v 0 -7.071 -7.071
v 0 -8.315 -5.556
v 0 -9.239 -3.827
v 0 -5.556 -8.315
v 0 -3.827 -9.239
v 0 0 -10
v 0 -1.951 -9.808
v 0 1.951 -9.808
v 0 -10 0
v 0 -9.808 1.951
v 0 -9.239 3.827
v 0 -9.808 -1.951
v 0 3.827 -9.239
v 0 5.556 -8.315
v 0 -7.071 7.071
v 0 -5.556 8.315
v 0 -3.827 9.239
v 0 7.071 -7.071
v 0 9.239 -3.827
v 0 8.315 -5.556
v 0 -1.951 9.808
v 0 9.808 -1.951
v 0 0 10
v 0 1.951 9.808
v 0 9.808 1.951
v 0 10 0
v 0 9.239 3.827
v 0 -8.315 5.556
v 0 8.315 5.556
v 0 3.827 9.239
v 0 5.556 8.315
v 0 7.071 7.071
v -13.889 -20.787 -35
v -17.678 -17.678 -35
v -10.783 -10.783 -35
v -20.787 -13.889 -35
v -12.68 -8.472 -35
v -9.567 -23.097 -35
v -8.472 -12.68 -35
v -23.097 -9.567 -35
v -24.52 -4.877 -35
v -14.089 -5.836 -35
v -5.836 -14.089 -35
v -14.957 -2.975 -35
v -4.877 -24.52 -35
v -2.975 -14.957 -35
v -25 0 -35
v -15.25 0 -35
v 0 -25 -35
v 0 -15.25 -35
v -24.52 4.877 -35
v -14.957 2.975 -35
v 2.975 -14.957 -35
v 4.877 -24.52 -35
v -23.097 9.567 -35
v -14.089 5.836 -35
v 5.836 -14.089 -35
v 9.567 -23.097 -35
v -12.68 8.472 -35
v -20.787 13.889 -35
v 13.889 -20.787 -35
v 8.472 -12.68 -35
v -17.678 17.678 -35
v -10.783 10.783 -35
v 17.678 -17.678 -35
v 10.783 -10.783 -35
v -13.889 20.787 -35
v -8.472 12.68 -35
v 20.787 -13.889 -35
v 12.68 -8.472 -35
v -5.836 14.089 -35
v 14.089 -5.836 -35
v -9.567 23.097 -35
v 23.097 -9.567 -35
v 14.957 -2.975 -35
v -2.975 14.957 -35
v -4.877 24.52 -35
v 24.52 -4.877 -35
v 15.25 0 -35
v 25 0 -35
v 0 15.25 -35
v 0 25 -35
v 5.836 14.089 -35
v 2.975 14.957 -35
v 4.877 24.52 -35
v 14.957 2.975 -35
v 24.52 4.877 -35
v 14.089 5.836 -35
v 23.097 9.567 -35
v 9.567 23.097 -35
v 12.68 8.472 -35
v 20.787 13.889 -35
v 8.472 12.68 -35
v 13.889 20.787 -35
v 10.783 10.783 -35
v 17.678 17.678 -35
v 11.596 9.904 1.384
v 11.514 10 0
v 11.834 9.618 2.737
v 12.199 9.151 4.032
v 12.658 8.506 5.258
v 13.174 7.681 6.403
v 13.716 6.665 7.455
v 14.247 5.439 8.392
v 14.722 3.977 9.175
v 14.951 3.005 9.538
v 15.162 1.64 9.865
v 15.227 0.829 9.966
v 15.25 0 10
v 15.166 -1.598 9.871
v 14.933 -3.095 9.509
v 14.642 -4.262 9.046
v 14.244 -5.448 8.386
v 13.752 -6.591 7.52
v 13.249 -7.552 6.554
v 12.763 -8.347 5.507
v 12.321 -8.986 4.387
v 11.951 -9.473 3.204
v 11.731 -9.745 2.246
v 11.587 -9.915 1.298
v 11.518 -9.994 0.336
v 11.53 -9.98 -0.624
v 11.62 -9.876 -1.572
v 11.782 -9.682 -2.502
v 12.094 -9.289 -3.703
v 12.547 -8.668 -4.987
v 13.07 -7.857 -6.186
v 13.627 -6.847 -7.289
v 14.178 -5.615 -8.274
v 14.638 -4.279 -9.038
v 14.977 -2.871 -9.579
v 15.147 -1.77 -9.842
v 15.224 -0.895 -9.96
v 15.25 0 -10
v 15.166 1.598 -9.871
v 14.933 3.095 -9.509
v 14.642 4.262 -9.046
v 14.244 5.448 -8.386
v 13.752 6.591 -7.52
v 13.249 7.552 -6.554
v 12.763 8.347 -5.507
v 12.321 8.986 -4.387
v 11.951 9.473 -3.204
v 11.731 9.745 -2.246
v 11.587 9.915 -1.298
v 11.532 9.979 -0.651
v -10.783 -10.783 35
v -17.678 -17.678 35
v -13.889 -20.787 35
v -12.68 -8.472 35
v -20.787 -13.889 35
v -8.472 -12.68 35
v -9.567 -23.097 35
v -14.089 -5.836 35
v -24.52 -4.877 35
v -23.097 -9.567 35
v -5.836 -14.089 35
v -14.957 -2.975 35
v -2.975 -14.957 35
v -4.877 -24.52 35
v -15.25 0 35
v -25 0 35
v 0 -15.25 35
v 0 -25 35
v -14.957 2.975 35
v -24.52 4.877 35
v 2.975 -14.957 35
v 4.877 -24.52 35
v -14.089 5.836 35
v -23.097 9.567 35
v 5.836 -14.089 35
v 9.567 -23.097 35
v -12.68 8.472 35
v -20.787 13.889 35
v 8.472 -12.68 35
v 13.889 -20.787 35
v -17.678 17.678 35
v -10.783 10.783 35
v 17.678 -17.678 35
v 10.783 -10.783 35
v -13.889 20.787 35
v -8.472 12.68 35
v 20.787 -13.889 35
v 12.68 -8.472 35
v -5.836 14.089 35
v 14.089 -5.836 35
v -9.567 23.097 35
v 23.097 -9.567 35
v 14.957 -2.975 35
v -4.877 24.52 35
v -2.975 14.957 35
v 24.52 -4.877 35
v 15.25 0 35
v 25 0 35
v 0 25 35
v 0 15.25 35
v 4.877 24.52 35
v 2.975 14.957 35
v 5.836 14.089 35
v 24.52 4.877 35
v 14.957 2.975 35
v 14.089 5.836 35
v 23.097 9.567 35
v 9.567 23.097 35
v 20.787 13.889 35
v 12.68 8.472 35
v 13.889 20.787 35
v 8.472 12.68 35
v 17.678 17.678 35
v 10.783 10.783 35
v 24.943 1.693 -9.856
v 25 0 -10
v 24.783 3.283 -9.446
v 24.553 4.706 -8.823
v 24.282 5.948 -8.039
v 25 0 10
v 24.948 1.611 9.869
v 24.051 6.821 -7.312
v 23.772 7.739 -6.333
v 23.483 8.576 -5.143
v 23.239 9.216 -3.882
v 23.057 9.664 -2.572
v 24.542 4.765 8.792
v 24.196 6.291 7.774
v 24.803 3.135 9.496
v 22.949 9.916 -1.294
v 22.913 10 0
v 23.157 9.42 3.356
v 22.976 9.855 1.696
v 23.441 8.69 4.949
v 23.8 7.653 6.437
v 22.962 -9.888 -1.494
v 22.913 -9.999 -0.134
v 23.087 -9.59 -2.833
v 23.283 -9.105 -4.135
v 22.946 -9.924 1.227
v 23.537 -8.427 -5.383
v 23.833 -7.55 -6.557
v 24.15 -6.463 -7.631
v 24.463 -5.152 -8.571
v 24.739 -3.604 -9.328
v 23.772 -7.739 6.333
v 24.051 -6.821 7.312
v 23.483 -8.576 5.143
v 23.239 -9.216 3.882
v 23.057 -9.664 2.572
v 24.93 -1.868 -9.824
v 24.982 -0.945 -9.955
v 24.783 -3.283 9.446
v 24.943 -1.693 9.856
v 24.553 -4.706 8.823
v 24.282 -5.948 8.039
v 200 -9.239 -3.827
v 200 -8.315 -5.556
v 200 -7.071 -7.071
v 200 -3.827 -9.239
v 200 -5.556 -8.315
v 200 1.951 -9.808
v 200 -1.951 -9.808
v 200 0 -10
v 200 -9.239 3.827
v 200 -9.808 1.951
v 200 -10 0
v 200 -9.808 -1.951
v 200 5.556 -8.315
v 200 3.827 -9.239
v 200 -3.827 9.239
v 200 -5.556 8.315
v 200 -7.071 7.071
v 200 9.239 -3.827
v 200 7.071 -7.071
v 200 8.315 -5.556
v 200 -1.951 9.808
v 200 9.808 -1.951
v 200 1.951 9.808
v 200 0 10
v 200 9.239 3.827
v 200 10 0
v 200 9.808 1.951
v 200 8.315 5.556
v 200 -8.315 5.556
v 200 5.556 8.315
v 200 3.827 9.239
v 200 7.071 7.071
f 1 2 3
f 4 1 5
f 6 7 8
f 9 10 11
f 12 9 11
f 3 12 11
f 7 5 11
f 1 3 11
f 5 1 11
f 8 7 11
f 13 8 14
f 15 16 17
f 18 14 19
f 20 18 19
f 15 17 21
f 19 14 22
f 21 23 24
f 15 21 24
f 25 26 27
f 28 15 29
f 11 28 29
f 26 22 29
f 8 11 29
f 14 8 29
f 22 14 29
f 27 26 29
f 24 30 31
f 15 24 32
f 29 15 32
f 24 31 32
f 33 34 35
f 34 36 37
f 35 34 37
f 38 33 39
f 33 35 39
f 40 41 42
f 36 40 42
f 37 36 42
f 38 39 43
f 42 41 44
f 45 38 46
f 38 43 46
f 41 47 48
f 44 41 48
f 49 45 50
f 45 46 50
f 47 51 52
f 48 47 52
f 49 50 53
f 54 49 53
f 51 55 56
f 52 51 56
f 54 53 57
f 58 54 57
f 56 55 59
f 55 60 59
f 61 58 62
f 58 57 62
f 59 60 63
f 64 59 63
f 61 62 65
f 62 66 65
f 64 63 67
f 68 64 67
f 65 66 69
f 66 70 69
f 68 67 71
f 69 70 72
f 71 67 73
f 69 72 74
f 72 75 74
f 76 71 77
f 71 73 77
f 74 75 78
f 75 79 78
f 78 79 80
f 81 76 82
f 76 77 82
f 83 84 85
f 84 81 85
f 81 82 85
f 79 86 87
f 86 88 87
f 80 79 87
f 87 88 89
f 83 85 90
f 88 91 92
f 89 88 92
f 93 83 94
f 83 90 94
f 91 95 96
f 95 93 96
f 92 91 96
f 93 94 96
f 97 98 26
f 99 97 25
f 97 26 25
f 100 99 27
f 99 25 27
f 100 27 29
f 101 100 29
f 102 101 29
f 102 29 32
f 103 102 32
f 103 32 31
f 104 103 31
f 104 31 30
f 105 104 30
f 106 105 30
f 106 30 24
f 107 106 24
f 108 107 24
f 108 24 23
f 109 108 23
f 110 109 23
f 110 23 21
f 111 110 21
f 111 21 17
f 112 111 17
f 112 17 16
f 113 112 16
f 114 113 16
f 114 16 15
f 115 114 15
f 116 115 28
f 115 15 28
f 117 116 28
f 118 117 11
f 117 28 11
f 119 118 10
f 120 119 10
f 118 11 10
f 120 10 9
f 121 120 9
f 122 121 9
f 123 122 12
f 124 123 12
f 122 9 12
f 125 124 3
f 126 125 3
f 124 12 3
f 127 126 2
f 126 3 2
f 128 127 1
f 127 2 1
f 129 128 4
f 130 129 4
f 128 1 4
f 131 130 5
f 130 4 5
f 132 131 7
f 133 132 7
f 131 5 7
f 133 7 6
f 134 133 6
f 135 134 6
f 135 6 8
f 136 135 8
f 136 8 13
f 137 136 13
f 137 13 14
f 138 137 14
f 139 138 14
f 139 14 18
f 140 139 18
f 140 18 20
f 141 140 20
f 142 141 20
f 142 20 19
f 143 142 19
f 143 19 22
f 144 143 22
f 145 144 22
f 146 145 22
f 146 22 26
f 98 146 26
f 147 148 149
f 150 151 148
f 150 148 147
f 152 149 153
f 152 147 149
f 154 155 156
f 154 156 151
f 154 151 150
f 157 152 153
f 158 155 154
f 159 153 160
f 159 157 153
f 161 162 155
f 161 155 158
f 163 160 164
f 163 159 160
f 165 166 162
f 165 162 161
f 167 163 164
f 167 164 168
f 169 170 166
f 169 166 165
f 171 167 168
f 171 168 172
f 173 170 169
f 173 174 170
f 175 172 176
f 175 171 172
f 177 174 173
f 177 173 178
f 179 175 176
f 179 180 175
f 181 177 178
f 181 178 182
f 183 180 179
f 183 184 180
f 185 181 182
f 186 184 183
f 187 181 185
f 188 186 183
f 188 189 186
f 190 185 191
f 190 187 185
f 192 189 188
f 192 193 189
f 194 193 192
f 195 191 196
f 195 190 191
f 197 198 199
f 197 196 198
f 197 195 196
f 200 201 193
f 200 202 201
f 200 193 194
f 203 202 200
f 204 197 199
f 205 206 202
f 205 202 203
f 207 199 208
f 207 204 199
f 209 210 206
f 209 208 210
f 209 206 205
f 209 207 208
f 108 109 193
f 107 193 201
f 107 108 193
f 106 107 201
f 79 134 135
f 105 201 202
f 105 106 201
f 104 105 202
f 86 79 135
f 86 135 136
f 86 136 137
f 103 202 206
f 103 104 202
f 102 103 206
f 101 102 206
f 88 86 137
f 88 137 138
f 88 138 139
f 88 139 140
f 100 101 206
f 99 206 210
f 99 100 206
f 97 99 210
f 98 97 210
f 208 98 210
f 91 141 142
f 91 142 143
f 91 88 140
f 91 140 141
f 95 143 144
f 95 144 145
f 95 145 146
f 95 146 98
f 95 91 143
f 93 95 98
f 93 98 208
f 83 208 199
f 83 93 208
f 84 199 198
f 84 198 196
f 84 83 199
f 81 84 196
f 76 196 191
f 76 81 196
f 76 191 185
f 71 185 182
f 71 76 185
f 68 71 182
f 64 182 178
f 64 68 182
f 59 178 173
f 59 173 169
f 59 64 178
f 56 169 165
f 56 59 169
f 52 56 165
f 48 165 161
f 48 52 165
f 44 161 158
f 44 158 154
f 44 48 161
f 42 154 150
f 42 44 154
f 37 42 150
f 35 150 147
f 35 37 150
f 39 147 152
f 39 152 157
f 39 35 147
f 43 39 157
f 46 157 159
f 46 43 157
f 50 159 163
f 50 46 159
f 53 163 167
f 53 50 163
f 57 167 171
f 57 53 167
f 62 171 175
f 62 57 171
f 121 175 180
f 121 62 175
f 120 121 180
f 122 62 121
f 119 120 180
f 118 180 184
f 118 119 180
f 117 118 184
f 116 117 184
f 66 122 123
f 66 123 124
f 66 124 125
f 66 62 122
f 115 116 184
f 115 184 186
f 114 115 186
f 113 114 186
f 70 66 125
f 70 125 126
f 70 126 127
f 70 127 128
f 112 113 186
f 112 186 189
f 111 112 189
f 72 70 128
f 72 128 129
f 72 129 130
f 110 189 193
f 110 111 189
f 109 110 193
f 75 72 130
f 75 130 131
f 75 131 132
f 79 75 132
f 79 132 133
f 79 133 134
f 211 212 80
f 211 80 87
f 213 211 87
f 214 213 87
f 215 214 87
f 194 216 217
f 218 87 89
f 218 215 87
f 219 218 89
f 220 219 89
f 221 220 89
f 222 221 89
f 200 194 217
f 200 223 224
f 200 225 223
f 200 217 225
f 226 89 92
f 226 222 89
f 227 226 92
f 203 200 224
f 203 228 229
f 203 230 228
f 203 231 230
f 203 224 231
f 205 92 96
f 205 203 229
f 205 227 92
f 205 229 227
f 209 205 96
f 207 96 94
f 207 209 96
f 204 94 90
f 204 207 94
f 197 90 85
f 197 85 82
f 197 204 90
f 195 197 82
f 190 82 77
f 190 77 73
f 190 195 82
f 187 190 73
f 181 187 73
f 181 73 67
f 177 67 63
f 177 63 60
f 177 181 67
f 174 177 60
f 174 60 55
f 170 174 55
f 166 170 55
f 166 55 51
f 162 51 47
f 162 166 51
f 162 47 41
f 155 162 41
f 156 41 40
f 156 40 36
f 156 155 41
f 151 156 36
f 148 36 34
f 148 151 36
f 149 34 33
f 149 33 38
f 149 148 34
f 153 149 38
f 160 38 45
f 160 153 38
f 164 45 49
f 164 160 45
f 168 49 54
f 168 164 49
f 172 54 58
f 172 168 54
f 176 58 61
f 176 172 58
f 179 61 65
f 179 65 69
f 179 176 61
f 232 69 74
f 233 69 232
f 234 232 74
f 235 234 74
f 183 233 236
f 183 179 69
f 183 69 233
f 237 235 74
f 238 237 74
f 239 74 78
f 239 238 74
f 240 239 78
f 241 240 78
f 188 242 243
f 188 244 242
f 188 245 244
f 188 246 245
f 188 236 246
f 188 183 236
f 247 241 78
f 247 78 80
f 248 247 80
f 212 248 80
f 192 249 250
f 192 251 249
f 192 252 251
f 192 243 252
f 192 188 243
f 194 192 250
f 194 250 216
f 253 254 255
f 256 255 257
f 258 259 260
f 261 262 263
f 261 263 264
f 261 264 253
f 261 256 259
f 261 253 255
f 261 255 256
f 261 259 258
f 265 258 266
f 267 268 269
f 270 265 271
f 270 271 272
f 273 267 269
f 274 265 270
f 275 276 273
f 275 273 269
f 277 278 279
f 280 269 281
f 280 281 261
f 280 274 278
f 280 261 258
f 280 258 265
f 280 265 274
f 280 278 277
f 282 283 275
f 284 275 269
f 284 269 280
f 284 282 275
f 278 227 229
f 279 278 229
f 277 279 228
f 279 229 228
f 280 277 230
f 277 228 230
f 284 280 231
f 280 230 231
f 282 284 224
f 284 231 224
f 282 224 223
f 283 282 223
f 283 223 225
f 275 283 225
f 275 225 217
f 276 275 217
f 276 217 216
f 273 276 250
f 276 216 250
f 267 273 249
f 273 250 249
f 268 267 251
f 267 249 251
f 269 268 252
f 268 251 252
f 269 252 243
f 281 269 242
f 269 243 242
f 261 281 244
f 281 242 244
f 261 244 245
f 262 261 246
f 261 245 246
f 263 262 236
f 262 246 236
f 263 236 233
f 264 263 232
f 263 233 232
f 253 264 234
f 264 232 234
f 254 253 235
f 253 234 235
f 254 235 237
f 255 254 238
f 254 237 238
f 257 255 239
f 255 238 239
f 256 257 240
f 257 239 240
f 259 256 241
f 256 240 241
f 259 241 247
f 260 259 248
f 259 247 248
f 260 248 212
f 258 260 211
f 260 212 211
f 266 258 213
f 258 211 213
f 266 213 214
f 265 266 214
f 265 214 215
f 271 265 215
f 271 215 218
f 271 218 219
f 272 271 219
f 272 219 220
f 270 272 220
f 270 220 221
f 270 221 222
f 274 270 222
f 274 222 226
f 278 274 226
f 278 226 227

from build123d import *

# Parameters (mm, degrees)
F0_R     = 25
F0_R_2   = 15.25
F1_DEPTH = 35
F2_R     = 10
F3_DEPTH = 200


with BuildPart() as f1:
    # F0 (on Top) → F1 (new body, symmetric)
    with BuildSketch(Plane.XY):
        Circle(F0_R)
        Circle(F0_R_2, mode=Mode.SUBTRACT)
    extrude(amount=F1_DEPTH, both=True)

    # F2 (on Right) → F3 (join)
    with BuildSketch(Plane.YZ):
        Circle(F2_R)
    extrude(amount=F3_DEPTH)


solid = f1.part
